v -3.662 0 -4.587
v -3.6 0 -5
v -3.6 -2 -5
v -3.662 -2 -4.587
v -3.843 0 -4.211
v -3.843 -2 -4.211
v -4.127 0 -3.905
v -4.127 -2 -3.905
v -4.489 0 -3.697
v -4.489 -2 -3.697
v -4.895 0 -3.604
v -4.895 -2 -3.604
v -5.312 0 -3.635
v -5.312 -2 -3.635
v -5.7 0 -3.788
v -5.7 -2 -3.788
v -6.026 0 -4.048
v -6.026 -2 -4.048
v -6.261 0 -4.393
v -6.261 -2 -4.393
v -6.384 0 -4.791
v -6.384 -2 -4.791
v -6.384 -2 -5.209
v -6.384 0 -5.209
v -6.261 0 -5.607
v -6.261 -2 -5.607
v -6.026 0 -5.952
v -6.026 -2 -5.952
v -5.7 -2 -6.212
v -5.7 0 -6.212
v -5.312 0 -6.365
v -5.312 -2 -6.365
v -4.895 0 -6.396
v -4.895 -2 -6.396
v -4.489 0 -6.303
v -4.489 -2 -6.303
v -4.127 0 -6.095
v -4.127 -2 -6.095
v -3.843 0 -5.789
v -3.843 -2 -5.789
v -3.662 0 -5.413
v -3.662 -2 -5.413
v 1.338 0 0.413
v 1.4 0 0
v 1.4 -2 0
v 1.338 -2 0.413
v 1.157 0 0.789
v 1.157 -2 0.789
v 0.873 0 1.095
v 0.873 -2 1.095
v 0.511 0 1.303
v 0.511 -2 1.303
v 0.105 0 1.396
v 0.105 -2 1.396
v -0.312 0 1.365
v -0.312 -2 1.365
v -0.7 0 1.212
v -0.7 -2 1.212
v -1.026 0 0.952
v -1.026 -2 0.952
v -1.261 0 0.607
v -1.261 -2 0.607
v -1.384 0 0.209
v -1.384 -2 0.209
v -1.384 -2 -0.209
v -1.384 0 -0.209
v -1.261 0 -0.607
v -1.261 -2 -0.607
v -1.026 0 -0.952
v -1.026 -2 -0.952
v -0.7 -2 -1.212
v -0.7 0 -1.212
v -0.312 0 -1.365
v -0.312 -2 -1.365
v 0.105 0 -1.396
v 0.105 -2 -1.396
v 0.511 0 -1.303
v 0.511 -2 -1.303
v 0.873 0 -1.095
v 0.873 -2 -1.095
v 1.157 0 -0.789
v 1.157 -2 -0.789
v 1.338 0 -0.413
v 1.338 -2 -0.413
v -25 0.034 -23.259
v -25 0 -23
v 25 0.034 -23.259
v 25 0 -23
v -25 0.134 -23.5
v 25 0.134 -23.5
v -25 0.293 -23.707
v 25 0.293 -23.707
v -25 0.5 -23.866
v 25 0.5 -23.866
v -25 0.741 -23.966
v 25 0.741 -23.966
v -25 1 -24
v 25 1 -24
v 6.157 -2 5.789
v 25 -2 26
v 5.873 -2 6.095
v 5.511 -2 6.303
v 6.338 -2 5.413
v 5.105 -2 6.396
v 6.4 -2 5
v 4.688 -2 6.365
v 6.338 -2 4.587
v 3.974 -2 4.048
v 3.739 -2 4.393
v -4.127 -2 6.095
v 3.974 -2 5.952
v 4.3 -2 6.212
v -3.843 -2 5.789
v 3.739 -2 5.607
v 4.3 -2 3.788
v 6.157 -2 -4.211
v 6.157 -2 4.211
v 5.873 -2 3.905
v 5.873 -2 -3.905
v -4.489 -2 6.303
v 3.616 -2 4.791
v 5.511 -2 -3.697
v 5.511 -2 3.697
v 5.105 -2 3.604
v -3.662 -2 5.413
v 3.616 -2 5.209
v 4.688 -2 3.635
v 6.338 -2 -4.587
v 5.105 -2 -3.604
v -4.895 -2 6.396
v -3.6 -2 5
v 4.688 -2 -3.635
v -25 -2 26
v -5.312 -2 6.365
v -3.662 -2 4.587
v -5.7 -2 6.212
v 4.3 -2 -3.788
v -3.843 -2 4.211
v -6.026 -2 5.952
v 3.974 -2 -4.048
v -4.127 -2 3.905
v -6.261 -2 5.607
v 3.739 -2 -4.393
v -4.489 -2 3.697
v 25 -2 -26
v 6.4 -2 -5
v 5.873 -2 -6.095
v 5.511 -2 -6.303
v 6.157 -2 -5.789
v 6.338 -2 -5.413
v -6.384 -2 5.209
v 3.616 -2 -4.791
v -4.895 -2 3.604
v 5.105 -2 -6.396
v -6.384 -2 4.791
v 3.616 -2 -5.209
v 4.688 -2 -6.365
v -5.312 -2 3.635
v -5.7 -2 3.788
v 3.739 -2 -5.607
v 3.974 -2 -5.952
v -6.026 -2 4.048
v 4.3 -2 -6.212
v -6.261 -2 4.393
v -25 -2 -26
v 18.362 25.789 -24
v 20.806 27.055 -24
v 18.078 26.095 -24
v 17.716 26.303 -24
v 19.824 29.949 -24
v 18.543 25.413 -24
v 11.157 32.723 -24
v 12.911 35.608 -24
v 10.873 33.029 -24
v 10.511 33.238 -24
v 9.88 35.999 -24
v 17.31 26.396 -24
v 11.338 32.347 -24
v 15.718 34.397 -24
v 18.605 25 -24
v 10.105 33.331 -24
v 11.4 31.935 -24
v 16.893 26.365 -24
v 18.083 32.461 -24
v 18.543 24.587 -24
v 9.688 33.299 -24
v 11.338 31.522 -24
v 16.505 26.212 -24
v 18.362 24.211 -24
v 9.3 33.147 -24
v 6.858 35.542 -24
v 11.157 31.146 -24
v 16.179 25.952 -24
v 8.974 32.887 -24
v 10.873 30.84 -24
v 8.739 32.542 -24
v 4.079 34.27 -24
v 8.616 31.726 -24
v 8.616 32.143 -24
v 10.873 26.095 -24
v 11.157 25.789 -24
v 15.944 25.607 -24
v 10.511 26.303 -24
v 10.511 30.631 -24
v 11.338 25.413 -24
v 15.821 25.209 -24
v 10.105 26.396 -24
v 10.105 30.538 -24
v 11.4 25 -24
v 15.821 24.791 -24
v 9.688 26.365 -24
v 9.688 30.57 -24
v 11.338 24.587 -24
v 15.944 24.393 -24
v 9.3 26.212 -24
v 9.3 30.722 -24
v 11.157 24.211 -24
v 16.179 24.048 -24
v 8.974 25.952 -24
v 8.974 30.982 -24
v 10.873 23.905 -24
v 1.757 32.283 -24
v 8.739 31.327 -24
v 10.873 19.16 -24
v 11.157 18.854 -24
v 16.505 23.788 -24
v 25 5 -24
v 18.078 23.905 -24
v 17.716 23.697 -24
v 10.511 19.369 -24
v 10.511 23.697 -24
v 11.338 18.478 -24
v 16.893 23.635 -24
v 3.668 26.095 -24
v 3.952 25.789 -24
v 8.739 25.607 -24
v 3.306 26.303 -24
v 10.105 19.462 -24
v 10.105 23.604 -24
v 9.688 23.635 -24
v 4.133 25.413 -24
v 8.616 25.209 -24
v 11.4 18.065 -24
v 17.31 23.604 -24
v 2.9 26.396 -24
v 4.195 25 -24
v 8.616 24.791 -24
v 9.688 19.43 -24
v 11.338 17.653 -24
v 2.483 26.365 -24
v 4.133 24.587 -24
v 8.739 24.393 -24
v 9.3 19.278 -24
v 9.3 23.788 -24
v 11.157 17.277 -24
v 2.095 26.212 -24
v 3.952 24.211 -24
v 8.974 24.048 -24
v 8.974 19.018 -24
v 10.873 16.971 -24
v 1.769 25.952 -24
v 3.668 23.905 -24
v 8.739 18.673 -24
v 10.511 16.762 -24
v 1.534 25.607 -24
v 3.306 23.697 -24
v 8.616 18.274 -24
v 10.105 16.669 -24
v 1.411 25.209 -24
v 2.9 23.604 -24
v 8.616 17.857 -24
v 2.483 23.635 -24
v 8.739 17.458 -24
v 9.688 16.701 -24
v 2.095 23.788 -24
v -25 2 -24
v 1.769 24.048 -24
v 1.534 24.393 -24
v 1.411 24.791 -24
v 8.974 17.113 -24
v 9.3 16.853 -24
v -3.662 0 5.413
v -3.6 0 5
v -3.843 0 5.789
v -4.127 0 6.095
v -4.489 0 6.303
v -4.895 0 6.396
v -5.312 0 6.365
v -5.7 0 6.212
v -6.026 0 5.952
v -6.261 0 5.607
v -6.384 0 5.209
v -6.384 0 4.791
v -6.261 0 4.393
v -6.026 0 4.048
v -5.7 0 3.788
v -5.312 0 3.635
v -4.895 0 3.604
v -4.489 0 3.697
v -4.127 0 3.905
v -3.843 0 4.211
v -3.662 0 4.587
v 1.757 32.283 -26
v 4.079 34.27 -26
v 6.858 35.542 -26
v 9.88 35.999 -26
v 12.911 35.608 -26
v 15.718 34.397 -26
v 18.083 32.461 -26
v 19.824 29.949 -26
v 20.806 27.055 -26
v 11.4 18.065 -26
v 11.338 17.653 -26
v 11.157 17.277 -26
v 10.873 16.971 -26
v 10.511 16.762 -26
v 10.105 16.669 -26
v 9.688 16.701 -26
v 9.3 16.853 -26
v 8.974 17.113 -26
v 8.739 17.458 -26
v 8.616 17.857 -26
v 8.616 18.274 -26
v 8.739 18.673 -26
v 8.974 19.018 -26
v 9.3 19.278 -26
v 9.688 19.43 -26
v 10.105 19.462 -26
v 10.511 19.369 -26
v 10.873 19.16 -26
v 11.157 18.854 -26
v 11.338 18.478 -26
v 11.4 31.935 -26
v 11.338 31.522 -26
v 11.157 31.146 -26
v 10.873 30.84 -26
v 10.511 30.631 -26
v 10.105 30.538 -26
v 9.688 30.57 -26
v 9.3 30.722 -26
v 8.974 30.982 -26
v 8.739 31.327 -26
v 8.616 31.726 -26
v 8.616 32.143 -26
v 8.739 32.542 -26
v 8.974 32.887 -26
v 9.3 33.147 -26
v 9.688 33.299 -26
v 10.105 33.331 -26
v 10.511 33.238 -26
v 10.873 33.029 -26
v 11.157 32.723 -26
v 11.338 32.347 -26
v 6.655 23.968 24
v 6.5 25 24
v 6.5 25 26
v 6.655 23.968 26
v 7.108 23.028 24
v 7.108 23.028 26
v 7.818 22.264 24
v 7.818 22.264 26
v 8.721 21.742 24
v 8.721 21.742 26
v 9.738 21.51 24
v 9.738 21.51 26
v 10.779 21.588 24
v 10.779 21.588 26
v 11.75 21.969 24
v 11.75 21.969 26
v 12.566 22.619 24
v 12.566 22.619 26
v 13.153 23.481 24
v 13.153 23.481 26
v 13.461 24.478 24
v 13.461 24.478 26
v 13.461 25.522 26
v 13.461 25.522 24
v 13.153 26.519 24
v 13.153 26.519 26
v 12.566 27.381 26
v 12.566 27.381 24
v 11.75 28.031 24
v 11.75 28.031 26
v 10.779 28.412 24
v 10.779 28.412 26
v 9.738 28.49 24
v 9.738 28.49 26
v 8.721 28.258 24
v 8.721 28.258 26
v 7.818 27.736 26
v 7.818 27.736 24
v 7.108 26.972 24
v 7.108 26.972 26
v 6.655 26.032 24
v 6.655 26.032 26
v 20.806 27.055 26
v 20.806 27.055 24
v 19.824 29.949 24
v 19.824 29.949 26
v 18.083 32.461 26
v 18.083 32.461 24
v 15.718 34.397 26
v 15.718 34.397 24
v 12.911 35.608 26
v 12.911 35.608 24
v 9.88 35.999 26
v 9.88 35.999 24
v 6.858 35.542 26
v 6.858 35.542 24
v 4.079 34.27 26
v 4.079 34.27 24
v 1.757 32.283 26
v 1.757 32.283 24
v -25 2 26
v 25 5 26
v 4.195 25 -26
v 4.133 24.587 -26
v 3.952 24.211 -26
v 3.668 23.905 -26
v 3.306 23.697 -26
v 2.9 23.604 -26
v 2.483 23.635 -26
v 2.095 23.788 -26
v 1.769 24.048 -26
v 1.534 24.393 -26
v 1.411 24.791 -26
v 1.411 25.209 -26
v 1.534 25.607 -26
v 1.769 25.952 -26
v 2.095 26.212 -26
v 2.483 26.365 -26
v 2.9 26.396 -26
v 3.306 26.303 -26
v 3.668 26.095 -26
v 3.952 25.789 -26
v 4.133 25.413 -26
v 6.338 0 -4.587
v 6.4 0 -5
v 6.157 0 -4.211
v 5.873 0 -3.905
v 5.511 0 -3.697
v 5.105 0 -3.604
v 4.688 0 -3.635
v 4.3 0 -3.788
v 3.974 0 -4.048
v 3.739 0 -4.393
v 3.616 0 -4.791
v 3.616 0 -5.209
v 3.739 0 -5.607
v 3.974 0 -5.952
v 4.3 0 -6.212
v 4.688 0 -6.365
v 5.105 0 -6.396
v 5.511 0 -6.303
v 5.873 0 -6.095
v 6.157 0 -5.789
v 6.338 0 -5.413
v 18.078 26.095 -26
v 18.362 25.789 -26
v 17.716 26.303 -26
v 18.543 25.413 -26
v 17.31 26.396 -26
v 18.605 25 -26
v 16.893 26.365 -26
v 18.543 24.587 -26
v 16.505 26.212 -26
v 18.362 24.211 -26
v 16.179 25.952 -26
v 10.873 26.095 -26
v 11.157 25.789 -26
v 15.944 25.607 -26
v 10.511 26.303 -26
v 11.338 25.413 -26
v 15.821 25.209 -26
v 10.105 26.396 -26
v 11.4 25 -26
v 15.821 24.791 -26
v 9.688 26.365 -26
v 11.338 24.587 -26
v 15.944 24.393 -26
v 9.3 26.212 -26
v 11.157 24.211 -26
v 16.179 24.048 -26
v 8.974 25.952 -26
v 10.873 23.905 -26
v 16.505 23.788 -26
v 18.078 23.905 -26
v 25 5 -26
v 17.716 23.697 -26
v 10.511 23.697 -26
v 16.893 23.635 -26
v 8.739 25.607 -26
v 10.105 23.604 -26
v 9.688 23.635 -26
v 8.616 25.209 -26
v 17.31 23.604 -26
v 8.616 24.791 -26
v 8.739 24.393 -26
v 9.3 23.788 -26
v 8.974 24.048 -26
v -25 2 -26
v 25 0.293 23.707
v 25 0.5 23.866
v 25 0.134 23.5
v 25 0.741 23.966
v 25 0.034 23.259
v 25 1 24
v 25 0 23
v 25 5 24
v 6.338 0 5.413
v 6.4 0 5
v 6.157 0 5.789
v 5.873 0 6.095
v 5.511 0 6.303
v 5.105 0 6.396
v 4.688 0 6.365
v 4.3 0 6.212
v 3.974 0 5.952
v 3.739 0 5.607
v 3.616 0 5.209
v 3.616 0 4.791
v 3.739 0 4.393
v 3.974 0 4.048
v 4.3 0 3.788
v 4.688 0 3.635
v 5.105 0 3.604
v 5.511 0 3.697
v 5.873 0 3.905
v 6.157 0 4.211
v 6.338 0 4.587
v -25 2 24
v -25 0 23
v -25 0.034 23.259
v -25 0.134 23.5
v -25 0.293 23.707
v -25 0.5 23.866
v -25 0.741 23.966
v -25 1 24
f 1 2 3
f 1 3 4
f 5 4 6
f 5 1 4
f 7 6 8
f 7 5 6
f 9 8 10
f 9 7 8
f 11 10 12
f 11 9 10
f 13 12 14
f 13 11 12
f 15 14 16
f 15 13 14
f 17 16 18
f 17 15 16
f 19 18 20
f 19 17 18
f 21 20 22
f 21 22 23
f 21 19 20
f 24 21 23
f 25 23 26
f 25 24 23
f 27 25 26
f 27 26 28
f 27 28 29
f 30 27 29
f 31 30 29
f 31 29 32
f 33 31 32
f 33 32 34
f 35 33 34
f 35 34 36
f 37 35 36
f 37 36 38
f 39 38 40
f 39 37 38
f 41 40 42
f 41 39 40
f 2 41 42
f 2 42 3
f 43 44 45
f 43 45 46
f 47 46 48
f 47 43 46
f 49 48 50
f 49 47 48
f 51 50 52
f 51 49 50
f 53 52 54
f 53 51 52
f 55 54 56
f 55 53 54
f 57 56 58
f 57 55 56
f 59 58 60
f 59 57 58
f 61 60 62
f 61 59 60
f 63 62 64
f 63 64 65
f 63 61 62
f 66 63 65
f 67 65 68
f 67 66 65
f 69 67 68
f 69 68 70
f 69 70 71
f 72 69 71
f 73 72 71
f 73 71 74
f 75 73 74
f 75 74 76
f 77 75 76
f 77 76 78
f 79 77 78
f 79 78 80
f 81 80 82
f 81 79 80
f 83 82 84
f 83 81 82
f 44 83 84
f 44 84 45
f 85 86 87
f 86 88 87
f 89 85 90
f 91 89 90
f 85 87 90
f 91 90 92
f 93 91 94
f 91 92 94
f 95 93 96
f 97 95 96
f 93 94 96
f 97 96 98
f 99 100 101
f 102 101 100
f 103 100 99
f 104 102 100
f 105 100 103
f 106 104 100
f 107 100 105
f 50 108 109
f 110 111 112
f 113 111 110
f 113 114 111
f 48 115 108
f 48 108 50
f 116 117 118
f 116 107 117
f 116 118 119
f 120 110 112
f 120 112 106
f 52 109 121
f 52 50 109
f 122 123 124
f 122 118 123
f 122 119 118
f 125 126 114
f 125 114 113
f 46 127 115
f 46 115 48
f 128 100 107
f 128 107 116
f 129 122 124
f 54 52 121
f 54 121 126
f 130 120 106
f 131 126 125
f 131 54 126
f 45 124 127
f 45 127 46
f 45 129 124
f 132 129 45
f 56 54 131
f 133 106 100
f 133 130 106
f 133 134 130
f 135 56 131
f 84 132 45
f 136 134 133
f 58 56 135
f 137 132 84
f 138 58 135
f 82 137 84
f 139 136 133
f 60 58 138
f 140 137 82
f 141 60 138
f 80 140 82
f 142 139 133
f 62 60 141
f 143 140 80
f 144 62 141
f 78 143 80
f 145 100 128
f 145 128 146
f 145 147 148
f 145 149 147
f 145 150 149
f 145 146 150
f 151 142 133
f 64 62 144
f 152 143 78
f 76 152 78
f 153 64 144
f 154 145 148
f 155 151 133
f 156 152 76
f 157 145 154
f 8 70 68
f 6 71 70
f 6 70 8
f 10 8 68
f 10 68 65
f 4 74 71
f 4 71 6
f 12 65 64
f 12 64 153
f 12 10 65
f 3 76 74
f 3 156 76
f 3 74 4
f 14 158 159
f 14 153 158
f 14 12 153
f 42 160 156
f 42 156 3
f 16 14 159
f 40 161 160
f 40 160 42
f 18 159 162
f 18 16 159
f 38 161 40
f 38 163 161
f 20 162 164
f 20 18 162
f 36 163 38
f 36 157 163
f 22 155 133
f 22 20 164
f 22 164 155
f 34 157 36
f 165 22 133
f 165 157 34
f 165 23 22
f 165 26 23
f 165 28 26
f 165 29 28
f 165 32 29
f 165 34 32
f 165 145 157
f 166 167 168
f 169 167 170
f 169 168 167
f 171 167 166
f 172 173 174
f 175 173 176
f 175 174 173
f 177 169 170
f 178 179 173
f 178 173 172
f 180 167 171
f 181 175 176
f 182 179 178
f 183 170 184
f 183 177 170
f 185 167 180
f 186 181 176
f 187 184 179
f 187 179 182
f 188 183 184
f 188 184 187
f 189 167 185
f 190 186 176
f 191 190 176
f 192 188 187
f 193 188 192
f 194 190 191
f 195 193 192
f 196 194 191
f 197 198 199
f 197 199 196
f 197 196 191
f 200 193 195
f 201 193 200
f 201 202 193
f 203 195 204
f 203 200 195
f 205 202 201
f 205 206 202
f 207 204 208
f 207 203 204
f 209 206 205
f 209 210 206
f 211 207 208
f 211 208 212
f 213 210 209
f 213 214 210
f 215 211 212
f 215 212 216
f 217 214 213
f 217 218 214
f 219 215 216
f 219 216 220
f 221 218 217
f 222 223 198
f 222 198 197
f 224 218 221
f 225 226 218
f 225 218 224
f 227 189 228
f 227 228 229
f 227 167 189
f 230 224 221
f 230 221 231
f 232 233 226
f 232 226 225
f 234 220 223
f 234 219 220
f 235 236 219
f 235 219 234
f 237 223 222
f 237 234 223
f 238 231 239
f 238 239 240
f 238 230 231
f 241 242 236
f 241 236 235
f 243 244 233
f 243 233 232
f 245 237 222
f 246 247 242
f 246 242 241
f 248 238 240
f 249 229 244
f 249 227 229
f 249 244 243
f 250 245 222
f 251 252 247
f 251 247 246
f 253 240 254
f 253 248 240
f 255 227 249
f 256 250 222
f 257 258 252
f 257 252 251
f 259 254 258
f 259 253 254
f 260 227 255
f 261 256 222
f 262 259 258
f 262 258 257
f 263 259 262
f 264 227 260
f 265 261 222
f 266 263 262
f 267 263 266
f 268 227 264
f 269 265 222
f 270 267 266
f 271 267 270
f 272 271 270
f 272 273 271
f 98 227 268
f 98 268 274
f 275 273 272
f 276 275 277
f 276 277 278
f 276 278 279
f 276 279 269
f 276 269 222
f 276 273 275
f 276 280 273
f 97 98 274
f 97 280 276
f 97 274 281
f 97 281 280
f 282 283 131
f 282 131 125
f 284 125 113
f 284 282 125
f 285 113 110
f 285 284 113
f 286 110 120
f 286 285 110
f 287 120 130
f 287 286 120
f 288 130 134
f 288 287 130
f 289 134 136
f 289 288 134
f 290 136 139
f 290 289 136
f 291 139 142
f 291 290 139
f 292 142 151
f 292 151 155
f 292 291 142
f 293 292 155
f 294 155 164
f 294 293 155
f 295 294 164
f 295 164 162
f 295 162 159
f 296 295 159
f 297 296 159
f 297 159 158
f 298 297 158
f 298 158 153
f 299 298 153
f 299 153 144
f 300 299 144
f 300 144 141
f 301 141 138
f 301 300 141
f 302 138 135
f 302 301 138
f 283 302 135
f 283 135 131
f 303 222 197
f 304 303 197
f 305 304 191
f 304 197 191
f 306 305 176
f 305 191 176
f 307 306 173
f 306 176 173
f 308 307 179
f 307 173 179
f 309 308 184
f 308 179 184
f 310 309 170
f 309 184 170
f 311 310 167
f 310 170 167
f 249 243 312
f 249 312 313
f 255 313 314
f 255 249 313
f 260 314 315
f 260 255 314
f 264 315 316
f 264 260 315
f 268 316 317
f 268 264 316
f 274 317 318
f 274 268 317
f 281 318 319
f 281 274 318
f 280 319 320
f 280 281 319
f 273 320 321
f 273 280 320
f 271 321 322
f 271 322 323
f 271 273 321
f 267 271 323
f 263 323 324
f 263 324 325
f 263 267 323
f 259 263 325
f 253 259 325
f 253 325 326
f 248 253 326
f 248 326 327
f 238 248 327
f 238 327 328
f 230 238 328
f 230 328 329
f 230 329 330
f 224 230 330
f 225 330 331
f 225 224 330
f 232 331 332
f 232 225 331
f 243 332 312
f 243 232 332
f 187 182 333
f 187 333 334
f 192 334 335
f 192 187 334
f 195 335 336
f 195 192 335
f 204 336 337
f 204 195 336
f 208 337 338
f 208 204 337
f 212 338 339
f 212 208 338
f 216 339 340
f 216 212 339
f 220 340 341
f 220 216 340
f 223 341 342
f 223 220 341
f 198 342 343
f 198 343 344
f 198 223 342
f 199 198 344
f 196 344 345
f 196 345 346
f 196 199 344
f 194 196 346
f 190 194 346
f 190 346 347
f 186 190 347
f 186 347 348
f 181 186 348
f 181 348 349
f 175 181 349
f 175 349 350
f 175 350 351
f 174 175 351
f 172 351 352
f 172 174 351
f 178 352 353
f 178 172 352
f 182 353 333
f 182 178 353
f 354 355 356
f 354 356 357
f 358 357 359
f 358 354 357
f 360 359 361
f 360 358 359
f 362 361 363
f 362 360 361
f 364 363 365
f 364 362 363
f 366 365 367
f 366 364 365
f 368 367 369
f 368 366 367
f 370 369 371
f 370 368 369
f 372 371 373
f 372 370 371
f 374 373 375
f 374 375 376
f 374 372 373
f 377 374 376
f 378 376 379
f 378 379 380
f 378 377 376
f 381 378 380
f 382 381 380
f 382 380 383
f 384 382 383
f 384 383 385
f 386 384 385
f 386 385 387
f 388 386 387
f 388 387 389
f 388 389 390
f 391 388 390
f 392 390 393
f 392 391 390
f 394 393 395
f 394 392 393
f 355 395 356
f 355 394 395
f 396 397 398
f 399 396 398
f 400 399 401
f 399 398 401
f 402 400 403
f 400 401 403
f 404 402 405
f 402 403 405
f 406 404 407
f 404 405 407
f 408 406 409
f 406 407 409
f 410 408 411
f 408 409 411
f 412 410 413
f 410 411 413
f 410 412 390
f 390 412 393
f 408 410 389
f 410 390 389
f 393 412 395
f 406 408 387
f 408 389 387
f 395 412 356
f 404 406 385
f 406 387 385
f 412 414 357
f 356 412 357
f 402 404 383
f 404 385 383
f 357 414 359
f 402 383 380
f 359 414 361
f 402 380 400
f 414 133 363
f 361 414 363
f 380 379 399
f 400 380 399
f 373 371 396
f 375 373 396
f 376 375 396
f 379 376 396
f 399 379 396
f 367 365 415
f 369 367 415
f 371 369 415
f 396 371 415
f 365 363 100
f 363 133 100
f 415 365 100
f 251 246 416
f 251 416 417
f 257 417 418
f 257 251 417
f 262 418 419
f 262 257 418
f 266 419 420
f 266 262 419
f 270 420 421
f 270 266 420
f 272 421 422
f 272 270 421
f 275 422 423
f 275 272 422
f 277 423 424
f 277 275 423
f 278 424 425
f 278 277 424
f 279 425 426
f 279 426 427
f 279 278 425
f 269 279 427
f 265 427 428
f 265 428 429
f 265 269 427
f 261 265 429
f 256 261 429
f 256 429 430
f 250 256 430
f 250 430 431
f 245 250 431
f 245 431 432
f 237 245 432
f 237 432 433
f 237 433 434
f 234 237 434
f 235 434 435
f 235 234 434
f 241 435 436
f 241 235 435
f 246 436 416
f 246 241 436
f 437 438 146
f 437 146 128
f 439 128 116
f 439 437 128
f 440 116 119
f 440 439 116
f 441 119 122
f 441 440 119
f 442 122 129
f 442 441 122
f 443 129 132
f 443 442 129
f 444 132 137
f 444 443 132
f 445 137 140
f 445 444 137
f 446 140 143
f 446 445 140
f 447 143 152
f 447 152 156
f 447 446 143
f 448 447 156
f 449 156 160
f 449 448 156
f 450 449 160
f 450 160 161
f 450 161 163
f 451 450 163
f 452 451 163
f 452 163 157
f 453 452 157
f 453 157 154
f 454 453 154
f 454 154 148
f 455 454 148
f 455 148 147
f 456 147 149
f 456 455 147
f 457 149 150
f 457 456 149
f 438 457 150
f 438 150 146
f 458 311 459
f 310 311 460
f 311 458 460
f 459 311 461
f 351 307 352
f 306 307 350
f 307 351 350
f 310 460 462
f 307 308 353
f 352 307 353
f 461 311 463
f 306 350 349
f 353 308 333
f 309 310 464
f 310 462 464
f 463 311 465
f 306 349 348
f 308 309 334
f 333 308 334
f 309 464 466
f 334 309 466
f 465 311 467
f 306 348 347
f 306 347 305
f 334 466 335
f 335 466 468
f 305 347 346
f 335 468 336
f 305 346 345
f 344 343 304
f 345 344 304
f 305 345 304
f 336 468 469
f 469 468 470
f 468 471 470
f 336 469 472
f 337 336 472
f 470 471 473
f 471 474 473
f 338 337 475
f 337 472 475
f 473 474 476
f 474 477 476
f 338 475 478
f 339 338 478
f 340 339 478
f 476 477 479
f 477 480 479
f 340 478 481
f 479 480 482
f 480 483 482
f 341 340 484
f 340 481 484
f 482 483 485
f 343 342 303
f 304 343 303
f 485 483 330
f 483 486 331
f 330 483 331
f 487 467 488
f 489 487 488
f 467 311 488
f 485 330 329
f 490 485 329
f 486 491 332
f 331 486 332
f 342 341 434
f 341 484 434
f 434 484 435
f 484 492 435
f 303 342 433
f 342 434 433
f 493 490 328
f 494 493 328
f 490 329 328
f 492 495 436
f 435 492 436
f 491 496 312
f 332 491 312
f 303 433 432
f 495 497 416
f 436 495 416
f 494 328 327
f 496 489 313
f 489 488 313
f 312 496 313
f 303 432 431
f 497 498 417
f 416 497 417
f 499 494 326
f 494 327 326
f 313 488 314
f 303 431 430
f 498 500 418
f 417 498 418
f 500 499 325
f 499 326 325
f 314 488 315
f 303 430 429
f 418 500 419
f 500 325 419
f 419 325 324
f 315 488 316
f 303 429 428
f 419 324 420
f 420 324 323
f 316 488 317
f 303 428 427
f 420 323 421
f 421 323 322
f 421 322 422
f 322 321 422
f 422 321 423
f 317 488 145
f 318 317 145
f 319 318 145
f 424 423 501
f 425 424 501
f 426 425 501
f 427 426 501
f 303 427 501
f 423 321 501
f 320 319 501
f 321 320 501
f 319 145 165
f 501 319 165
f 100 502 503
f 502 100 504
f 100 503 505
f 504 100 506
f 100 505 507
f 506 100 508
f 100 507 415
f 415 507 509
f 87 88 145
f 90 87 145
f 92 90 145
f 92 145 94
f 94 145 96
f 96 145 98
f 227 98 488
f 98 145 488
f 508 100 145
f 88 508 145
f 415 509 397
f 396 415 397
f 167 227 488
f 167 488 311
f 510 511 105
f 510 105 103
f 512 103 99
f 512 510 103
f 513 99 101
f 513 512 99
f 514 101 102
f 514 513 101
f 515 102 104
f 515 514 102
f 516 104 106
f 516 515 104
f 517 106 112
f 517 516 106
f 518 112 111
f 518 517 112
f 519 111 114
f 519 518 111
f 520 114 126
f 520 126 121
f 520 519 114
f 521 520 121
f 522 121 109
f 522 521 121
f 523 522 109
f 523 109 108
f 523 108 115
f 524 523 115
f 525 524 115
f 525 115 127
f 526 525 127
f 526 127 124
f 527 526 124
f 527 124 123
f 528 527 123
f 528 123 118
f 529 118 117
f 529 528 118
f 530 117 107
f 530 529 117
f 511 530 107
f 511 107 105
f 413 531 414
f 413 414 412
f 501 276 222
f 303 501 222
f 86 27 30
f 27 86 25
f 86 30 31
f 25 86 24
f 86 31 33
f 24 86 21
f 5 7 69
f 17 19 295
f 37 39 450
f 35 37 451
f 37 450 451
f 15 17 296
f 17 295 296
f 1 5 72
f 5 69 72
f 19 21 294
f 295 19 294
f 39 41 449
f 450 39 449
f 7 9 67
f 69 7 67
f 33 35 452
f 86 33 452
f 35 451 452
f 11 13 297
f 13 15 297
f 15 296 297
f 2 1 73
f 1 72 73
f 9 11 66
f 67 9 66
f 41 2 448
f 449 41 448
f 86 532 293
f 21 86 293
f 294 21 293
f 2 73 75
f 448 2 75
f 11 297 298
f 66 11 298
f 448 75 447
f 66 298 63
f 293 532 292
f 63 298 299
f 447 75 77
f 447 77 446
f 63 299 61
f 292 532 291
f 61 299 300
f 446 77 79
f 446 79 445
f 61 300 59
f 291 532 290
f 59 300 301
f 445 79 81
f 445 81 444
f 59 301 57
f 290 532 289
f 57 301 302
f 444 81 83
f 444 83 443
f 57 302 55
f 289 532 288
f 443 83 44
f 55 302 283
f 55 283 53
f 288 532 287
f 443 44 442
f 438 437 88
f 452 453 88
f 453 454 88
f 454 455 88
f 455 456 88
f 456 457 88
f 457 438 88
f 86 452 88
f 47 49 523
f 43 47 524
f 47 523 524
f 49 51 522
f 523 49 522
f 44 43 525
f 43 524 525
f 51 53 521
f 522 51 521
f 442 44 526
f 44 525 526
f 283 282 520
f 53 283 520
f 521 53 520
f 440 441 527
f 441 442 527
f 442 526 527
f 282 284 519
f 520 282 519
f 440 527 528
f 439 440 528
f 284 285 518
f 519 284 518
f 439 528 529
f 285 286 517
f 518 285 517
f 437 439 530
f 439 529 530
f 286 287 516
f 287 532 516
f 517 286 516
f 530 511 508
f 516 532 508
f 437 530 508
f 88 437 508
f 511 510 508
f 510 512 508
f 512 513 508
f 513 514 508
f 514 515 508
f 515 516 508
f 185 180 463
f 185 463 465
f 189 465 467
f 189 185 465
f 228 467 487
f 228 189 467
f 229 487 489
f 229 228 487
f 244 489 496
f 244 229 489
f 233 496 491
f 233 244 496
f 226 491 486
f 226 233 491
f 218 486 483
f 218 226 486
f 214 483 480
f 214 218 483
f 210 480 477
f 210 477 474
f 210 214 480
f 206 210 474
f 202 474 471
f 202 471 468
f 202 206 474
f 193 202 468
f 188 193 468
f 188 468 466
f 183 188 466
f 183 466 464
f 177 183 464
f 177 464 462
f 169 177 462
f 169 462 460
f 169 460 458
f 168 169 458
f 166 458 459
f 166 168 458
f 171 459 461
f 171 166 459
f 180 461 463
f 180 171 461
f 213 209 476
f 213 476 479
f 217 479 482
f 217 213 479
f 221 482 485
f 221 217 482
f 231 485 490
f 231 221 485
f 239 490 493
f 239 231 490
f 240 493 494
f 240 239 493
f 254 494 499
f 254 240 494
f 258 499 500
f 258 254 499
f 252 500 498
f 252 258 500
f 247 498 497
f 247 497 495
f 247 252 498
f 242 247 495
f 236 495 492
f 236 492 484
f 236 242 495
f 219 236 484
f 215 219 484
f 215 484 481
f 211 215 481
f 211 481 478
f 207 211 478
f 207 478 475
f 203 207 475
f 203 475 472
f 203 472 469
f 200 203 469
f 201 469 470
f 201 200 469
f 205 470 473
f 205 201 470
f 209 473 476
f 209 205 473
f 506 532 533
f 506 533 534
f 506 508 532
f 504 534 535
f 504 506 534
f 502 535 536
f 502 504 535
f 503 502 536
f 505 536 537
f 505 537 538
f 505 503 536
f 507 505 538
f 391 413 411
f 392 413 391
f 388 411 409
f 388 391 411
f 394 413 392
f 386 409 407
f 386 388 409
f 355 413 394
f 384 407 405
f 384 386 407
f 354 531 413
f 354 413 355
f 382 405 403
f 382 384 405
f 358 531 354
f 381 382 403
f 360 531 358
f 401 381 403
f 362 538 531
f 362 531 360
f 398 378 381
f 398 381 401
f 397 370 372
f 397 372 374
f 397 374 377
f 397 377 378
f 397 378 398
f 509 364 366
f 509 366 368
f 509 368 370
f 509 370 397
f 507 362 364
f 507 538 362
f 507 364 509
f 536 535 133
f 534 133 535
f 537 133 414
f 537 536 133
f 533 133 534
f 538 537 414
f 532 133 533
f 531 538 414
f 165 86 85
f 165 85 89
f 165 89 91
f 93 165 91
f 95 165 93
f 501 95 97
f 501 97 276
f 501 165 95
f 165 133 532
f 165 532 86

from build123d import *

# Parameters (mm, degrees)
SKETCH_W     = 50
SKETCH_H     = 48
SKETCH_R     = 1.4
PAD_DEPTH    = 2
SKETCH003_R  = 1.4
PAD001_DEPTH = 2
SKETCH004_R  = 3.5
PAD002_DEPTH = 2
FILLET_R     = 1
FILLET001_R  = 1


with BuildPart() as part:
    # Sketch → Pad (new body)
    with BuildSketch(Plane.XZ):
        Rectangle(SKETCH_W, SKETCH_H)
        with Locations((-5, 5)):
            Circle(SKETCH_R, mode=Mode.SUBTRACT)
        with Locations((5, 5)):
            Circle(SKETCH_R, mode=Mode.SUBTRACT)
        with Locations((-5, -5)):
            Circle(SKETCH_R, mode=Mode.SUBTRACT)
        with Locations((5, -5)):
            Circle(SKETCH_R, mode=Mode.SUBTRACT)
        Circle(SKETCH_R, mode=Mode.SUBTRACT)
    extrude(amount=PAD_DEPTH)

    # Sketch003 (on Face3 of Pad) → Pad001 (join)
    with BuildSketch(Plane(origin=(0, 0, -24), x_dir=(1, 0, 0), z_dir=(0, 0, -1))):
        with BuildLine():
            Line((-25, 0), (-25, 2))
            Line((-25, 2), (25, 2))
            Line((25, 2), (25, 0))
            Line((25, 0), (25, -5))
            Line((25, -5), (20.80638, -27.054785))
            ThreePointArc((1.756653, -32.283353), (12.911489, -35.607697), (20.80638, -27.054785))
            Line((-25, -2), (1.756653, -32.283353))
            Line((-25, 0), (-25, -2))
        make_face()
        with Locations((10, -31.934549)):
            Circle(SKETCH003_R, mode=Mode.SUBTRACT)
        with Locations((17.205, -25)):
            Circle(SKETCH003_R, mode=Mode.SUBTRACT)
        with Locations((10, -25)):
            Circle(SKETCH003_R, mode=Mode.SUBTRACT)
        with Locations((2.795, -25)):
            Circle(SKETCH003_R, mode=Mode.SUBTRACT)
        with Locations((10, -18.065451)):
            Circle(SKETCH003_R, mode=Mode.SUBTRACT)
    extrude(amount=PAD001_DEPTH)

    # Sketch004 (on Face1 of Pad) → Pad002 (join)
    with BuildSketch(Plane(origin=(0, 0, 24), x_dir=(-1, 0, 0), z_dir=(0, 0, 1))):
        with BuildLine():
            Line((-25, 2), (25, 2))
            Line((25, 2), (25, 0))
            Line((25, 0), (25, -2))
            Line((25, -2), (-1.756653, -32.283353))
            ThreePointArc((-20.80638, -27.054785), (-12.911489, -35.607697), (-1.756653, -32.283353))
            Line((-25, -5), (-20.80638, -27.054785))
            Line((-25, 0), (-25, -5))
            Line((-25, 0), (-25, 2))
        make_face()
        with Locations((-10, -25)):
            Circle(SKETCH004_R, mode=Mode.SUBTRACT)
    extrude(amount=PAD002_DEPTH)

    # Fillet
    fillet_edges = [part.edges().sort_by_distance(p)[0] for p in [
        (0, 0, 24),
    ]]
    fillet(fillet_edges, radius=FILLET_R)

    # Fillet001
    fillet001_edges = [part.edges().sort_by_distance(p)[0] for p in [
        (0, 0, -24),
    ]]
    fillet(fillet001_edges, radius=FILLET001_R)


solid = part.part
